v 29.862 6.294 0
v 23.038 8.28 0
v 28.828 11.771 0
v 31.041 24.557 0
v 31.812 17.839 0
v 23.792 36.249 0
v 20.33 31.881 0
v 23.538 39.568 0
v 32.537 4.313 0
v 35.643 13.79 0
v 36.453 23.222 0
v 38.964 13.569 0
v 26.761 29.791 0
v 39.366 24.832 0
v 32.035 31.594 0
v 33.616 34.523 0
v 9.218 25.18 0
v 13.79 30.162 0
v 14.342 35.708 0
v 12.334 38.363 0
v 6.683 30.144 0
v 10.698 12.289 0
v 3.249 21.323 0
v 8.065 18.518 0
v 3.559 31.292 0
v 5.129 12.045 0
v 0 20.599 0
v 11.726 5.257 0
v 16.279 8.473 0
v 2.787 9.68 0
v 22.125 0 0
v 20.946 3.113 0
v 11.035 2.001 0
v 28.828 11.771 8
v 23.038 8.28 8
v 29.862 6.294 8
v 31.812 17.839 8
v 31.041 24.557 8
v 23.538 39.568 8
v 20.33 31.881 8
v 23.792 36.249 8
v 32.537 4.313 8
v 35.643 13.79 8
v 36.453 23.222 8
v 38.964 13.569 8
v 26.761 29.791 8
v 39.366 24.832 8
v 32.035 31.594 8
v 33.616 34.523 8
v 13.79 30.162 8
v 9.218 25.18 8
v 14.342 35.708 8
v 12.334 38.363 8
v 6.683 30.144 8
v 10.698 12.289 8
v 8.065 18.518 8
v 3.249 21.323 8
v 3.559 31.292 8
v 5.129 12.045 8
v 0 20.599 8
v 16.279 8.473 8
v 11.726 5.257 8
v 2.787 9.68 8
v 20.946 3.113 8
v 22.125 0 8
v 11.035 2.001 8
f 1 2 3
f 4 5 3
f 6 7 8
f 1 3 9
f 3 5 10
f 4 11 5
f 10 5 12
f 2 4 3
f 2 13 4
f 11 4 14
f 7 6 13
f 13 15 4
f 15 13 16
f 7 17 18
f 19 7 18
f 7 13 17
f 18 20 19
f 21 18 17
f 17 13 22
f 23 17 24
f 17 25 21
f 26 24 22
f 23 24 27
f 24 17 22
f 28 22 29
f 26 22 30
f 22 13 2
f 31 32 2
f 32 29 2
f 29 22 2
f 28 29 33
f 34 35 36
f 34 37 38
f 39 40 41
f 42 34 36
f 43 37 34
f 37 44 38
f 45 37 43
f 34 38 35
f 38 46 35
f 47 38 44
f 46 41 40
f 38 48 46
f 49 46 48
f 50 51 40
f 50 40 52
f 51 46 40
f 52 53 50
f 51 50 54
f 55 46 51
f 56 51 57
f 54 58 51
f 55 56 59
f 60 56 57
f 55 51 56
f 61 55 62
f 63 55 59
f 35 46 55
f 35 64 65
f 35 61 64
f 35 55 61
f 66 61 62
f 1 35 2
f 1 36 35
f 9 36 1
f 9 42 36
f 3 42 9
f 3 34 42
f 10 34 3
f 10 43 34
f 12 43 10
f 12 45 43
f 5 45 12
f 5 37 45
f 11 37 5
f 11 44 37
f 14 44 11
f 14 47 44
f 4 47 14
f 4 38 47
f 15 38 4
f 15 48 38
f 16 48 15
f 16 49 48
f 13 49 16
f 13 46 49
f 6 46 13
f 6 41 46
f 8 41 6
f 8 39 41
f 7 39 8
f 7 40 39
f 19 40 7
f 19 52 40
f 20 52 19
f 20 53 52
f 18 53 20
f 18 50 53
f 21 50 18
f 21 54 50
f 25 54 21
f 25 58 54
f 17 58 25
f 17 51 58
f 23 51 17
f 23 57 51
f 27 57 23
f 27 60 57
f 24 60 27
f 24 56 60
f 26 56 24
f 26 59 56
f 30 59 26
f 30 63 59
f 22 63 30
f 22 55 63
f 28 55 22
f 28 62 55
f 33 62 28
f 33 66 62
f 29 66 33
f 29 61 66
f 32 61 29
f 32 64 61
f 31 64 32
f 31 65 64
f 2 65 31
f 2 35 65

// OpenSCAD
$fn = 32;

// ----------------------------------------------------------------------
// Fan rotor section: 11 blades, 12 mm hub radius, 8 mm blades
// ----------------------------------------------------------------------

// --- parameters (mm) ---
profile_height = 8;       // extrusion height
profile_points = 33;      // points of the closed outline

profile = [[31.812, 17.839], [36.453, 23.222], [39.366, 24.832], [31.041, 24.557], [32.035, 31.594], [33.616, 34.523], [26.761, 29.791], [23.792, 36.249], [23.538, 39.568], [20.33, 31.881], [14.342, 35.708], [12.334, 38.363], [13.79, 30.162], [6.683, 30.144], [3.559, 31.292], [9.218, 25.18], [3.249, 21.323], [0, 20.599], [8.065, 18.518], [5.129, 12.045], [2.787, 9.68], [10.698, 12.289], [11.726, 5.257], [11.035, 2.001], [16.279, 8.473], [20.946, 3.113], [22.125, 0], [23.038, 8.28], [29.862, 6.294], [32.537, 4.313], [28.828, 11.771], [35.643, 13.79], [38.964, 13.569]];  // single closed polygon, 33 points, counter clockwise

// --- the one profile operation ---
linear_extrude(height = profile_height) polygon(points = profile);
